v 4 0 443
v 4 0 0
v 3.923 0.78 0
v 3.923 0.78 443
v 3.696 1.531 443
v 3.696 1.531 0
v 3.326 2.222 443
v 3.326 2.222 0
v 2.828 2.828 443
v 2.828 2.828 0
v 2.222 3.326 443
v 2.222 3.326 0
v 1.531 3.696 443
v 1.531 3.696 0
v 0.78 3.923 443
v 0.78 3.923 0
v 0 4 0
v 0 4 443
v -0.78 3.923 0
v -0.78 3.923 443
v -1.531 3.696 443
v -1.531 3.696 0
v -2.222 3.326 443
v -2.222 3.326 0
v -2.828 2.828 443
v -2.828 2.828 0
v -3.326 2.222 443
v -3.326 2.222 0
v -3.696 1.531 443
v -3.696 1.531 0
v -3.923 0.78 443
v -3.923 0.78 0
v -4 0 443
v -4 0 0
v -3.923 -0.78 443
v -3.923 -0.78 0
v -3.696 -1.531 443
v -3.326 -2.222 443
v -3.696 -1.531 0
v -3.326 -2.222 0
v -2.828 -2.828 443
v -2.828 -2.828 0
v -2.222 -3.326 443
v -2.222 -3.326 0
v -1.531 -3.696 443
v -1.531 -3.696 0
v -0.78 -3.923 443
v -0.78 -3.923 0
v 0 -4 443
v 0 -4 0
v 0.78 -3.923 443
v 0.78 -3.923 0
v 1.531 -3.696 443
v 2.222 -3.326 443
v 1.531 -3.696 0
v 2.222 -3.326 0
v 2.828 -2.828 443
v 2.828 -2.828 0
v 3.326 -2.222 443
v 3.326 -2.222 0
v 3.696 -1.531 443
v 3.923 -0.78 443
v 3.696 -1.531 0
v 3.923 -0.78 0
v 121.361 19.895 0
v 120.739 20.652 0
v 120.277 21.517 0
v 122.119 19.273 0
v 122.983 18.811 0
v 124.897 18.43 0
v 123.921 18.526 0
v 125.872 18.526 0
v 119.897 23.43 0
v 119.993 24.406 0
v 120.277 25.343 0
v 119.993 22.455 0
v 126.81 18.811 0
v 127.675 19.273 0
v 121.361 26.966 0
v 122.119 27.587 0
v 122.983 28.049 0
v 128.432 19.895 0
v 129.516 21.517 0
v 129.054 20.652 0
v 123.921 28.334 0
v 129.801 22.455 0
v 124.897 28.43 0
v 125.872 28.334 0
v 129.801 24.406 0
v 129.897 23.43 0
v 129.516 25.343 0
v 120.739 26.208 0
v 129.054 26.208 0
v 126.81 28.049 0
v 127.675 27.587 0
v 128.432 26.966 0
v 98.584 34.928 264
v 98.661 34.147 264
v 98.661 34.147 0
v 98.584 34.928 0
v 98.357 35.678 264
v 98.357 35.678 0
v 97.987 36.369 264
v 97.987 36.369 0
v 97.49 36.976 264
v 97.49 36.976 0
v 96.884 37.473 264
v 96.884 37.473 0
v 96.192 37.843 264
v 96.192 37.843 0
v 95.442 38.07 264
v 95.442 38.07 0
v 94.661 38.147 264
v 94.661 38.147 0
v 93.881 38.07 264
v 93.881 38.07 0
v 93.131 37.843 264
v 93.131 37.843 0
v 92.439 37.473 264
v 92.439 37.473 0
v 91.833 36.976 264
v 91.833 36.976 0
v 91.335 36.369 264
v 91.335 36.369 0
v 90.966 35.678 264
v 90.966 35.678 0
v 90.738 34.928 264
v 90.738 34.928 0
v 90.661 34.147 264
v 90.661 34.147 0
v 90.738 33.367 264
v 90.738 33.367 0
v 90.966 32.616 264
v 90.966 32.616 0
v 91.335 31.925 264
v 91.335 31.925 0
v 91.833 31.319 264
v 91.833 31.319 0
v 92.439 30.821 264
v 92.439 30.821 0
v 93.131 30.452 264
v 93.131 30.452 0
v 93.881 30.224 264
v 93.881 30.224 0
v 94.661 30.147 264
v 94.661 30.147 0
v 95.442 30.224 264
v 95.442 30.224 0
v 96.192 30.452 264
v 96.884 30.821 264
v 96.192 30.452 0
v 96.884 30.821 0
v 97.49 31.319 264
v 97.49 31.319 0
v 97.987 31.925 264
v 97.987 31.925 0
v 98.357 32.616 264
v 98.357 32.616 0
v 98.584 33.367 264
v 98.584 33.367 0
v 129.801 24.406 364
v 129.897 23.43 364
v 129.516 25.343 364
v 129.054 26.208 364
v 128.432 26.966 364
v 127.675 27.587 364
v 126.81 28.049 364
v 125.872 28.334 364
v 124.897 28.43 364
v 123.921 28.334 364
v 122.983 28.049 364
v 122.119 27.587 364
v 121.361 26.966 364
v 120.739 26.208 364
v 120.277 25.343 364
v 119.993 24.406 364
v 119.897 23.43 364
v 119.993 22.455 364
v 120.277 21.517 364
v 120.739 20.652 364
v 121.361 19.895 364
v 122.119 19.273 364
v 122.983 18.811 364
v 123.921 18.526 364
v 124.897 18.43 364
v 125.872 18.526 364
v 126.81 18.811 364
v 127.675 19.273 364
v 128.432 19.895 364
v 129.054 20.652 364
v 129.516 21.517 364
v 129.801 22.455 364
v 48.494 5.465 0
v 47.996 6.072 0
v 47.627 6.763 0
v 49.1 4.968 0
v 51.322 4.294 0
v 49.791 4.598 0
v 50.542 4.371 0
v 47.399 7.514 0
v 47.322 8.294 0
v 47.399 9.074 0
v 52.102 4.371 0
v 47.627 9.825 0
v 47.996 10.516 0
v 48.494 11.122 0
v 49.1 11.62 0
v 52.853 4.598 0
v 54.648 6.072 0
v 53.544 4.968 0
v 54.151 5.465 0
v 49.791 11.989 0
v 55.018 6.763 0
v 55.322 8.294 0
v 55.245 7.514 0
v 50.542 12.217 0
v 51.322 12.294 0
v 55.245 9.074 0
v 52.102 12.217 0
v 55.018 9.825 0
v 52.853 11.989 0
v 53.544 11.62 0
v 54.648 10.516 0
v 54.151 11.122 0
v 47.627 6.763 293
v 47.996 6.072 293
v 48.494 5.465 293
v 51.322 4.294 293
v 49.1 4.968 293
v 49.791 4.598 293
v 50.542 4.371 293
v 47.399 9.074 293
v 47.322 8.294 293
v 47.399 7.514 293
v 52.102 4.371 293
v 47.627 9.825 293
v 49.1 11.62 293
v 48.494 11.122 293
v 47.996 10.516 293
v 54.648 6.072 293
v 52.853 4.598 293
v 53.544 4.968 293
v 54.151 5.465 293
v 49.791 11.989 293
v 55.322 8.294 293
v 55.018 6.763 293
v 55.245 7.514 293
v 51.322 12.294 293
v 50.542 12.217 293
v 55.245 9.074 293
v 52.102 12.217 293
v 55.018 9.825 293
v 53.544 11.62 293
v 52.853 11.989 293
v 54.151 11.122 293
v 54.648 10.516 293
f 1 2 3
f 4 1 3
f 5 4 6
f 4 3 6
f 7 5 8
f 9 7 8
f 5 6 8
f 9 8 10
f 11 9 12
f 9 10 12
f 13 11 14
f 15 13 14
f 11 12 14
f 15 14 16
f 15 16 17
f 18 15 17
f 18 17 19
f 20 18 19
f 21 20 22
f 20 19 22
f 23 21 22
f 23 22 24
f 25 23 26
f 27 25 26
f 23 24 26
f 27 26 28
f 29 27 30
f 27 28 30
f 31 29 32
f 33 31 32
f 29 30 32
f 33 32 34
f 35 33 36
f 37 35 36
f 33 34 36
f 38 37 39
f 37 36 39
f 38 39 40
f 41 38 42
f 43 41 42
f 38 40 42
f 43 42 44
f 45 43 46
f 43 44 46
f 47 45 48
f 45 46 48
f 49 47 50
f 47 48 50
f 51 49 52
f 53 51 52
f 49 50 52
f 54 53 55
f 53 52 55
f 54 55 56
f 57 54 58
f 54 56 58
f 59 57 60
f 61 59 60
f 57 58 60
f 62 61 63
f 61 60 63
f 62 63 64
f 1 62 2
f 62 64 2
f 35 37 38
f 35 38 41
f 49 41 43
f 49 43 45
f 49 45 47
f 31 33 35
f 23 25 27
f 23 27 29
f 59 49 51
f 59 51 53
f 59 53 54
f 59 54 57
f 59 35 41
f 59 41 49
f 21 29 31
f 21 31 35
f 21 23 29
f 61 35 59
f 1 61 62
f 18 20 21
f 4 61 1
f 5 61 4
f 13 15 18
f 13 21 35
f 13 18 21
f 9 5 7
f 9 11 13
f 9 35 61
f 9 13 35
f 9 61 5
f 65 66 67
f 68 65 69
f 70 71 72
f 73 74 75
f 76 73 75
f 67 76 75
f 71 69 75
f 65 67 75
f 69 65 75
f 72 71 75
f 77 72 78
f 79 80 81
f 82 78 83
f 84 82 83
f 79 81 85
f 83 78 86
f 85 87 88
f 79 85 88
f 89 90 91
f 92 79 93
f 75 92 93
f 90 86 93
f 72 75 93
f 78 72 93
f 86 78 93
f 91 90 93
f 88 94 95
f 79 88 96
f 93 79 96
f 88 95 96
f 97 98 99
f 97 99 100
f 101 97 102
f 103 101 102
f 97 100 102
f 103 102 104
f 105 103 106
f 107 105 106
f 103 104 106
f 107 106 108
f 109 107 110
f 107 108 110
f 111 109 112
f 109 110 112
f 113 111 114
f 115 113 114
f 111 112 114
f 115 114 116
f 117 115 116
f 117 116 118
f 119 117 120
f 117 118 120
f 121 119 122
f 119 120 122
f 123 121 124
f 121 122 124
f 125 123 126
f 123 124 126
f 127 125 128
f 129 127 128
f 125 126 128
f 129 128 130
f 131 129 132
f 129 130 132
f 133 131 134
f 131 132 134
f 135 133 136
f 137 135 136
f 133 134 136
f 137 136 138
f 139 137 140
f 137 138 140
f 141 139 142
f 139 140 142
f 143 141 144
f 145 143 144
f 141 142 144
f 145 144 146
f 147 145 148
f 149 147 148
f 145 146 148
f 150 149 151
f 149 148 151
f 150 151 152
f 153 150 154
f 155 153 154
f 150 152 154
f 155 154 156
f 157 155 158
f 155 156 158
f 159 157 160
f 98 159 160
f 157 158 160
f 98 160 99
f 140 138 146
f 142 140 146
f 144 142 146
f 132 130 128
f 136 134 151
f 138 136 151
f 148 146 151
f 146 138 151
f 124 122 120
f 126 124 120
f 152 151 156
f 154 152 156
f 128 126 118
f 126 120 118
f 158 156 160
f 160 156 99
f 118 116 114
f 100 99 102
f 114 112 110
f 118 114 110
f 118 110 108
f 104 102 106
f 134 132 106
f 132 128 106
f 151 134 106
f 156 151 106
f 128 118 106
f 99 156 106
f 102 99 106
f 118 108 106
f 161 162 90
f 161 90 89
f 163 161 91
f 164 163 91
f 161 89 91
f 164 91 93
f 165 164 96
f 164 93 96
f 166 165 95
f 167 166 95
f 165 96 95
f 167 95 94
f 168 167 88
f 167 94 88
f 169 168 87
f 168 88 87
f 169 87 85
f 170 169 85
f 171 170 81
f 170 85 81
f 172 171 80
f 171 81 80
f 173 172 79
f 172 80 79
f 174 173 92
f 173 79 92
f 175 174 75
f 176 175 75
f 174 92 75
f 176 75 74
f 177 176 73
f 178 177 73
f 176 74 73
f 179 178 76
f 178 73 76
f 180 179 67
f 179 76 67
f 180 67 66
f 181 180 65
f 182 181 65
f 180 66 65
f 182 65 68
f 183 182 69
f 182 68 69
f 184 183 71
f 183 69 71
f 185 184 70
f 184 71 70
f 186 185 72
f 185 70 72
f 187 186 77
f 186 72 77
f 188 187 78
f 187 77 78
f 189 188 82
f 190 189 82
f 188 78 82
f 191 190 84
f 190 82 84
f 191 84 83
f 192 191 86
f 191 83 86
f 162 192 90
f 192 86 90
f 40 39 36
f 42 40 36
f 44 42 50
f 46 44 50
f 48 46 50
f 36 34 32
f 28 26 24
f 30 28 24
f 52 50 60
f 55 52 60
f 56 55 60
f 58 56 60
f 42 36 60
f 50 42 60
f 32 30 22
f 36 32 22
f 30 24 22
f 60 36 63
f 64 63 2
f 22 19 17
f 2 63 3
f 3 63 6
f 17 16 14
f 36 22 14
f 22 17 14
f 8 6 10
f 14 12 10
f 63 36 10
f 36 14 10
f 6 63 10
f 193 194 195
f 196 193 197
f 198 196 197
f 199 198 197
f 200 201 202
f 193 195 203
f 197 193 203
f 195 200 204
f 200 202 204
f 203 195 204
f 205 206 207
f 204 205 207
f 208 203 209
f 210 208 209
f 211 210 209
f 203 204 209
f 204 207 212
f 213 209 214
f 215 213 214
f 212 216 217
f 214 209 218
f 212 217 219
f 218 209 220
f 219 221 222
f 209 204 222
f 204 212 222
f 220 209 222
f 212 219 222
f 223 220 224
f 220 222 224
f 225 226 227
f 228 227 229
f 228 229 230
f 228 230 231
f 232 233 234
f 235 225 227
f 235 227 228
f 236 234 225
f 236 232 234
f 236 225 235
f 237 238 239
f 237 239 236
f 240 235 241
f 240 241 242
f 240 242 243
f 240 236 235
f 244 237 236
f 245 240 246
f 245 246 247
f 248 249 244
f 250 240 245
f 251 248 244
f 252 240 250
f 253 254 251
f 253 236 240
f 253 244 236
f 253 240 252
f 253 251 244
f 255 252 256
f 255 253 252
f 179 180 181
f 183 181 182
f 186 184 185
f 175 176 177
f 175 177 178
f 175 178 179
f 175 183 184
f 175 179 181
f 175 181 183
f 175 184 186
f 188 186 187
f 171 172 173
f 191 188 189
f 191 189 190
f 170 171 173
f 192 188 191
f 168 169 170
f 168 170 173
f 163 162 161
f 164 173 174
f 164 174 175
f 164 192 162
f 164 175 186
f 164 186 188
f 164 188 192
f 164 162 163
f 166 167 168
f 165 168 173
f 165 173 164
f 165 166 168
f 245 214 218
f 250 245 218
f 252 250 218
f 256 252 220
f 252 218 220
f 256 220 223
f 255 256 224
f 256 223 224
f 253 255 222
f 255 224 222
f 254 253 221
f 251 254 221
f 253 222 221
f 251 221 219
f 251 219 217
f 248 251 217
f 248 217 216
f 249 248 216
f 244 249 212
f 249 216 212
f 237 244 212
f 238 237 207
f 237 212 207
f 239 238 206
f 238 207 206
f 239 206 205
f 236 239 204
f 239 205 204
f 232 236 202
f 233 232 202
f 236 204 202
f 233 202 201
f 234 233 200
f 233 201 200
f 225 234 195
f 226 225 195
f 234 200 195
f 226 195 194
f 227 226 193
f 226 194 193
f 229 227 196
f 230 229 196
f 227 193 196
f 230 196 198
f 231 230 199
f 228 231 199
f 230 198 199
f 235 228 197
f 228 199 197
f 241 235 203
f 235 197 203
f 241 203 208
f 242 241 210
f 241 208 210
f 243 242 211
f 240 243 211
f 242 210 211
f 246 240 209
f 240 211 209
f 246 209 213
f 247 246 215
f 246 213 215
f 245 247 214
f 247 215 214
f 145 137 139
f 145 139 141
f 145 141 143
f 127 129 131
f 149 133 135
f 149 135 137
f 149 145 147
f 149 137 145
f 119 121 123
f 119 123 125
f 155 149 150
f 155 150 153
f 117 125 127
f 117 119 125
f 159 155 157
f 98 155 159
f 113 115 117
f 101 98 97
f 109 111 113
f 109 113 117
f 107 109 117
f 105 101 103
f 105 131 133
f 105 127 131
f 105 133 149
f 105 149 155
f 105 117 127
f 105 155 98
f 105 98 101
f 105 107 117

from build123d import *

# Parameters (mm, degrees)
F0_R     = 4
F1_DEPTH = 443
F2_R     = 4
F3_DEPTH = 293
F4_R     = 4
F5_DEPTH = 264
F6_R     = 5
F7_DEPTH = 364


with BuildPart() as f1:
    # F0 (on Top) → F1 (new body)
    with BuildSketch(Plane.XY):
        Circle(F0_R)
    extrude(amount=F1_DEPTH)


with BuildPart() as f3:
    # F2 (on Top) → F3 (new body)
    with BuildSketch(Plane.XY):
        with Locations((51.322076, 8.29392)):
            Circle(F2_R)
    extrude(amount=F3_DEPTH)


with BuildPart() as f5:
    # F4 (on Top) → F5 (new body)
    with BuildSketch(Plane.XY):
        with Locations((94.661281, 34.147188)):
            Circle(F4_R)
    extrude(amount=F5_DEPTH)


with BuildPart() as f7:
    # F6 (on Top) → F7 (new body)
    with BuildSketch(Plane.XY):
        with Locations((124.89669, 23.430059)):
            Circle(F6_R)
    extrude(amount=F7_DEPTH)


solid = Compound([f1.part, f3.part, f5.part, f7.part])
